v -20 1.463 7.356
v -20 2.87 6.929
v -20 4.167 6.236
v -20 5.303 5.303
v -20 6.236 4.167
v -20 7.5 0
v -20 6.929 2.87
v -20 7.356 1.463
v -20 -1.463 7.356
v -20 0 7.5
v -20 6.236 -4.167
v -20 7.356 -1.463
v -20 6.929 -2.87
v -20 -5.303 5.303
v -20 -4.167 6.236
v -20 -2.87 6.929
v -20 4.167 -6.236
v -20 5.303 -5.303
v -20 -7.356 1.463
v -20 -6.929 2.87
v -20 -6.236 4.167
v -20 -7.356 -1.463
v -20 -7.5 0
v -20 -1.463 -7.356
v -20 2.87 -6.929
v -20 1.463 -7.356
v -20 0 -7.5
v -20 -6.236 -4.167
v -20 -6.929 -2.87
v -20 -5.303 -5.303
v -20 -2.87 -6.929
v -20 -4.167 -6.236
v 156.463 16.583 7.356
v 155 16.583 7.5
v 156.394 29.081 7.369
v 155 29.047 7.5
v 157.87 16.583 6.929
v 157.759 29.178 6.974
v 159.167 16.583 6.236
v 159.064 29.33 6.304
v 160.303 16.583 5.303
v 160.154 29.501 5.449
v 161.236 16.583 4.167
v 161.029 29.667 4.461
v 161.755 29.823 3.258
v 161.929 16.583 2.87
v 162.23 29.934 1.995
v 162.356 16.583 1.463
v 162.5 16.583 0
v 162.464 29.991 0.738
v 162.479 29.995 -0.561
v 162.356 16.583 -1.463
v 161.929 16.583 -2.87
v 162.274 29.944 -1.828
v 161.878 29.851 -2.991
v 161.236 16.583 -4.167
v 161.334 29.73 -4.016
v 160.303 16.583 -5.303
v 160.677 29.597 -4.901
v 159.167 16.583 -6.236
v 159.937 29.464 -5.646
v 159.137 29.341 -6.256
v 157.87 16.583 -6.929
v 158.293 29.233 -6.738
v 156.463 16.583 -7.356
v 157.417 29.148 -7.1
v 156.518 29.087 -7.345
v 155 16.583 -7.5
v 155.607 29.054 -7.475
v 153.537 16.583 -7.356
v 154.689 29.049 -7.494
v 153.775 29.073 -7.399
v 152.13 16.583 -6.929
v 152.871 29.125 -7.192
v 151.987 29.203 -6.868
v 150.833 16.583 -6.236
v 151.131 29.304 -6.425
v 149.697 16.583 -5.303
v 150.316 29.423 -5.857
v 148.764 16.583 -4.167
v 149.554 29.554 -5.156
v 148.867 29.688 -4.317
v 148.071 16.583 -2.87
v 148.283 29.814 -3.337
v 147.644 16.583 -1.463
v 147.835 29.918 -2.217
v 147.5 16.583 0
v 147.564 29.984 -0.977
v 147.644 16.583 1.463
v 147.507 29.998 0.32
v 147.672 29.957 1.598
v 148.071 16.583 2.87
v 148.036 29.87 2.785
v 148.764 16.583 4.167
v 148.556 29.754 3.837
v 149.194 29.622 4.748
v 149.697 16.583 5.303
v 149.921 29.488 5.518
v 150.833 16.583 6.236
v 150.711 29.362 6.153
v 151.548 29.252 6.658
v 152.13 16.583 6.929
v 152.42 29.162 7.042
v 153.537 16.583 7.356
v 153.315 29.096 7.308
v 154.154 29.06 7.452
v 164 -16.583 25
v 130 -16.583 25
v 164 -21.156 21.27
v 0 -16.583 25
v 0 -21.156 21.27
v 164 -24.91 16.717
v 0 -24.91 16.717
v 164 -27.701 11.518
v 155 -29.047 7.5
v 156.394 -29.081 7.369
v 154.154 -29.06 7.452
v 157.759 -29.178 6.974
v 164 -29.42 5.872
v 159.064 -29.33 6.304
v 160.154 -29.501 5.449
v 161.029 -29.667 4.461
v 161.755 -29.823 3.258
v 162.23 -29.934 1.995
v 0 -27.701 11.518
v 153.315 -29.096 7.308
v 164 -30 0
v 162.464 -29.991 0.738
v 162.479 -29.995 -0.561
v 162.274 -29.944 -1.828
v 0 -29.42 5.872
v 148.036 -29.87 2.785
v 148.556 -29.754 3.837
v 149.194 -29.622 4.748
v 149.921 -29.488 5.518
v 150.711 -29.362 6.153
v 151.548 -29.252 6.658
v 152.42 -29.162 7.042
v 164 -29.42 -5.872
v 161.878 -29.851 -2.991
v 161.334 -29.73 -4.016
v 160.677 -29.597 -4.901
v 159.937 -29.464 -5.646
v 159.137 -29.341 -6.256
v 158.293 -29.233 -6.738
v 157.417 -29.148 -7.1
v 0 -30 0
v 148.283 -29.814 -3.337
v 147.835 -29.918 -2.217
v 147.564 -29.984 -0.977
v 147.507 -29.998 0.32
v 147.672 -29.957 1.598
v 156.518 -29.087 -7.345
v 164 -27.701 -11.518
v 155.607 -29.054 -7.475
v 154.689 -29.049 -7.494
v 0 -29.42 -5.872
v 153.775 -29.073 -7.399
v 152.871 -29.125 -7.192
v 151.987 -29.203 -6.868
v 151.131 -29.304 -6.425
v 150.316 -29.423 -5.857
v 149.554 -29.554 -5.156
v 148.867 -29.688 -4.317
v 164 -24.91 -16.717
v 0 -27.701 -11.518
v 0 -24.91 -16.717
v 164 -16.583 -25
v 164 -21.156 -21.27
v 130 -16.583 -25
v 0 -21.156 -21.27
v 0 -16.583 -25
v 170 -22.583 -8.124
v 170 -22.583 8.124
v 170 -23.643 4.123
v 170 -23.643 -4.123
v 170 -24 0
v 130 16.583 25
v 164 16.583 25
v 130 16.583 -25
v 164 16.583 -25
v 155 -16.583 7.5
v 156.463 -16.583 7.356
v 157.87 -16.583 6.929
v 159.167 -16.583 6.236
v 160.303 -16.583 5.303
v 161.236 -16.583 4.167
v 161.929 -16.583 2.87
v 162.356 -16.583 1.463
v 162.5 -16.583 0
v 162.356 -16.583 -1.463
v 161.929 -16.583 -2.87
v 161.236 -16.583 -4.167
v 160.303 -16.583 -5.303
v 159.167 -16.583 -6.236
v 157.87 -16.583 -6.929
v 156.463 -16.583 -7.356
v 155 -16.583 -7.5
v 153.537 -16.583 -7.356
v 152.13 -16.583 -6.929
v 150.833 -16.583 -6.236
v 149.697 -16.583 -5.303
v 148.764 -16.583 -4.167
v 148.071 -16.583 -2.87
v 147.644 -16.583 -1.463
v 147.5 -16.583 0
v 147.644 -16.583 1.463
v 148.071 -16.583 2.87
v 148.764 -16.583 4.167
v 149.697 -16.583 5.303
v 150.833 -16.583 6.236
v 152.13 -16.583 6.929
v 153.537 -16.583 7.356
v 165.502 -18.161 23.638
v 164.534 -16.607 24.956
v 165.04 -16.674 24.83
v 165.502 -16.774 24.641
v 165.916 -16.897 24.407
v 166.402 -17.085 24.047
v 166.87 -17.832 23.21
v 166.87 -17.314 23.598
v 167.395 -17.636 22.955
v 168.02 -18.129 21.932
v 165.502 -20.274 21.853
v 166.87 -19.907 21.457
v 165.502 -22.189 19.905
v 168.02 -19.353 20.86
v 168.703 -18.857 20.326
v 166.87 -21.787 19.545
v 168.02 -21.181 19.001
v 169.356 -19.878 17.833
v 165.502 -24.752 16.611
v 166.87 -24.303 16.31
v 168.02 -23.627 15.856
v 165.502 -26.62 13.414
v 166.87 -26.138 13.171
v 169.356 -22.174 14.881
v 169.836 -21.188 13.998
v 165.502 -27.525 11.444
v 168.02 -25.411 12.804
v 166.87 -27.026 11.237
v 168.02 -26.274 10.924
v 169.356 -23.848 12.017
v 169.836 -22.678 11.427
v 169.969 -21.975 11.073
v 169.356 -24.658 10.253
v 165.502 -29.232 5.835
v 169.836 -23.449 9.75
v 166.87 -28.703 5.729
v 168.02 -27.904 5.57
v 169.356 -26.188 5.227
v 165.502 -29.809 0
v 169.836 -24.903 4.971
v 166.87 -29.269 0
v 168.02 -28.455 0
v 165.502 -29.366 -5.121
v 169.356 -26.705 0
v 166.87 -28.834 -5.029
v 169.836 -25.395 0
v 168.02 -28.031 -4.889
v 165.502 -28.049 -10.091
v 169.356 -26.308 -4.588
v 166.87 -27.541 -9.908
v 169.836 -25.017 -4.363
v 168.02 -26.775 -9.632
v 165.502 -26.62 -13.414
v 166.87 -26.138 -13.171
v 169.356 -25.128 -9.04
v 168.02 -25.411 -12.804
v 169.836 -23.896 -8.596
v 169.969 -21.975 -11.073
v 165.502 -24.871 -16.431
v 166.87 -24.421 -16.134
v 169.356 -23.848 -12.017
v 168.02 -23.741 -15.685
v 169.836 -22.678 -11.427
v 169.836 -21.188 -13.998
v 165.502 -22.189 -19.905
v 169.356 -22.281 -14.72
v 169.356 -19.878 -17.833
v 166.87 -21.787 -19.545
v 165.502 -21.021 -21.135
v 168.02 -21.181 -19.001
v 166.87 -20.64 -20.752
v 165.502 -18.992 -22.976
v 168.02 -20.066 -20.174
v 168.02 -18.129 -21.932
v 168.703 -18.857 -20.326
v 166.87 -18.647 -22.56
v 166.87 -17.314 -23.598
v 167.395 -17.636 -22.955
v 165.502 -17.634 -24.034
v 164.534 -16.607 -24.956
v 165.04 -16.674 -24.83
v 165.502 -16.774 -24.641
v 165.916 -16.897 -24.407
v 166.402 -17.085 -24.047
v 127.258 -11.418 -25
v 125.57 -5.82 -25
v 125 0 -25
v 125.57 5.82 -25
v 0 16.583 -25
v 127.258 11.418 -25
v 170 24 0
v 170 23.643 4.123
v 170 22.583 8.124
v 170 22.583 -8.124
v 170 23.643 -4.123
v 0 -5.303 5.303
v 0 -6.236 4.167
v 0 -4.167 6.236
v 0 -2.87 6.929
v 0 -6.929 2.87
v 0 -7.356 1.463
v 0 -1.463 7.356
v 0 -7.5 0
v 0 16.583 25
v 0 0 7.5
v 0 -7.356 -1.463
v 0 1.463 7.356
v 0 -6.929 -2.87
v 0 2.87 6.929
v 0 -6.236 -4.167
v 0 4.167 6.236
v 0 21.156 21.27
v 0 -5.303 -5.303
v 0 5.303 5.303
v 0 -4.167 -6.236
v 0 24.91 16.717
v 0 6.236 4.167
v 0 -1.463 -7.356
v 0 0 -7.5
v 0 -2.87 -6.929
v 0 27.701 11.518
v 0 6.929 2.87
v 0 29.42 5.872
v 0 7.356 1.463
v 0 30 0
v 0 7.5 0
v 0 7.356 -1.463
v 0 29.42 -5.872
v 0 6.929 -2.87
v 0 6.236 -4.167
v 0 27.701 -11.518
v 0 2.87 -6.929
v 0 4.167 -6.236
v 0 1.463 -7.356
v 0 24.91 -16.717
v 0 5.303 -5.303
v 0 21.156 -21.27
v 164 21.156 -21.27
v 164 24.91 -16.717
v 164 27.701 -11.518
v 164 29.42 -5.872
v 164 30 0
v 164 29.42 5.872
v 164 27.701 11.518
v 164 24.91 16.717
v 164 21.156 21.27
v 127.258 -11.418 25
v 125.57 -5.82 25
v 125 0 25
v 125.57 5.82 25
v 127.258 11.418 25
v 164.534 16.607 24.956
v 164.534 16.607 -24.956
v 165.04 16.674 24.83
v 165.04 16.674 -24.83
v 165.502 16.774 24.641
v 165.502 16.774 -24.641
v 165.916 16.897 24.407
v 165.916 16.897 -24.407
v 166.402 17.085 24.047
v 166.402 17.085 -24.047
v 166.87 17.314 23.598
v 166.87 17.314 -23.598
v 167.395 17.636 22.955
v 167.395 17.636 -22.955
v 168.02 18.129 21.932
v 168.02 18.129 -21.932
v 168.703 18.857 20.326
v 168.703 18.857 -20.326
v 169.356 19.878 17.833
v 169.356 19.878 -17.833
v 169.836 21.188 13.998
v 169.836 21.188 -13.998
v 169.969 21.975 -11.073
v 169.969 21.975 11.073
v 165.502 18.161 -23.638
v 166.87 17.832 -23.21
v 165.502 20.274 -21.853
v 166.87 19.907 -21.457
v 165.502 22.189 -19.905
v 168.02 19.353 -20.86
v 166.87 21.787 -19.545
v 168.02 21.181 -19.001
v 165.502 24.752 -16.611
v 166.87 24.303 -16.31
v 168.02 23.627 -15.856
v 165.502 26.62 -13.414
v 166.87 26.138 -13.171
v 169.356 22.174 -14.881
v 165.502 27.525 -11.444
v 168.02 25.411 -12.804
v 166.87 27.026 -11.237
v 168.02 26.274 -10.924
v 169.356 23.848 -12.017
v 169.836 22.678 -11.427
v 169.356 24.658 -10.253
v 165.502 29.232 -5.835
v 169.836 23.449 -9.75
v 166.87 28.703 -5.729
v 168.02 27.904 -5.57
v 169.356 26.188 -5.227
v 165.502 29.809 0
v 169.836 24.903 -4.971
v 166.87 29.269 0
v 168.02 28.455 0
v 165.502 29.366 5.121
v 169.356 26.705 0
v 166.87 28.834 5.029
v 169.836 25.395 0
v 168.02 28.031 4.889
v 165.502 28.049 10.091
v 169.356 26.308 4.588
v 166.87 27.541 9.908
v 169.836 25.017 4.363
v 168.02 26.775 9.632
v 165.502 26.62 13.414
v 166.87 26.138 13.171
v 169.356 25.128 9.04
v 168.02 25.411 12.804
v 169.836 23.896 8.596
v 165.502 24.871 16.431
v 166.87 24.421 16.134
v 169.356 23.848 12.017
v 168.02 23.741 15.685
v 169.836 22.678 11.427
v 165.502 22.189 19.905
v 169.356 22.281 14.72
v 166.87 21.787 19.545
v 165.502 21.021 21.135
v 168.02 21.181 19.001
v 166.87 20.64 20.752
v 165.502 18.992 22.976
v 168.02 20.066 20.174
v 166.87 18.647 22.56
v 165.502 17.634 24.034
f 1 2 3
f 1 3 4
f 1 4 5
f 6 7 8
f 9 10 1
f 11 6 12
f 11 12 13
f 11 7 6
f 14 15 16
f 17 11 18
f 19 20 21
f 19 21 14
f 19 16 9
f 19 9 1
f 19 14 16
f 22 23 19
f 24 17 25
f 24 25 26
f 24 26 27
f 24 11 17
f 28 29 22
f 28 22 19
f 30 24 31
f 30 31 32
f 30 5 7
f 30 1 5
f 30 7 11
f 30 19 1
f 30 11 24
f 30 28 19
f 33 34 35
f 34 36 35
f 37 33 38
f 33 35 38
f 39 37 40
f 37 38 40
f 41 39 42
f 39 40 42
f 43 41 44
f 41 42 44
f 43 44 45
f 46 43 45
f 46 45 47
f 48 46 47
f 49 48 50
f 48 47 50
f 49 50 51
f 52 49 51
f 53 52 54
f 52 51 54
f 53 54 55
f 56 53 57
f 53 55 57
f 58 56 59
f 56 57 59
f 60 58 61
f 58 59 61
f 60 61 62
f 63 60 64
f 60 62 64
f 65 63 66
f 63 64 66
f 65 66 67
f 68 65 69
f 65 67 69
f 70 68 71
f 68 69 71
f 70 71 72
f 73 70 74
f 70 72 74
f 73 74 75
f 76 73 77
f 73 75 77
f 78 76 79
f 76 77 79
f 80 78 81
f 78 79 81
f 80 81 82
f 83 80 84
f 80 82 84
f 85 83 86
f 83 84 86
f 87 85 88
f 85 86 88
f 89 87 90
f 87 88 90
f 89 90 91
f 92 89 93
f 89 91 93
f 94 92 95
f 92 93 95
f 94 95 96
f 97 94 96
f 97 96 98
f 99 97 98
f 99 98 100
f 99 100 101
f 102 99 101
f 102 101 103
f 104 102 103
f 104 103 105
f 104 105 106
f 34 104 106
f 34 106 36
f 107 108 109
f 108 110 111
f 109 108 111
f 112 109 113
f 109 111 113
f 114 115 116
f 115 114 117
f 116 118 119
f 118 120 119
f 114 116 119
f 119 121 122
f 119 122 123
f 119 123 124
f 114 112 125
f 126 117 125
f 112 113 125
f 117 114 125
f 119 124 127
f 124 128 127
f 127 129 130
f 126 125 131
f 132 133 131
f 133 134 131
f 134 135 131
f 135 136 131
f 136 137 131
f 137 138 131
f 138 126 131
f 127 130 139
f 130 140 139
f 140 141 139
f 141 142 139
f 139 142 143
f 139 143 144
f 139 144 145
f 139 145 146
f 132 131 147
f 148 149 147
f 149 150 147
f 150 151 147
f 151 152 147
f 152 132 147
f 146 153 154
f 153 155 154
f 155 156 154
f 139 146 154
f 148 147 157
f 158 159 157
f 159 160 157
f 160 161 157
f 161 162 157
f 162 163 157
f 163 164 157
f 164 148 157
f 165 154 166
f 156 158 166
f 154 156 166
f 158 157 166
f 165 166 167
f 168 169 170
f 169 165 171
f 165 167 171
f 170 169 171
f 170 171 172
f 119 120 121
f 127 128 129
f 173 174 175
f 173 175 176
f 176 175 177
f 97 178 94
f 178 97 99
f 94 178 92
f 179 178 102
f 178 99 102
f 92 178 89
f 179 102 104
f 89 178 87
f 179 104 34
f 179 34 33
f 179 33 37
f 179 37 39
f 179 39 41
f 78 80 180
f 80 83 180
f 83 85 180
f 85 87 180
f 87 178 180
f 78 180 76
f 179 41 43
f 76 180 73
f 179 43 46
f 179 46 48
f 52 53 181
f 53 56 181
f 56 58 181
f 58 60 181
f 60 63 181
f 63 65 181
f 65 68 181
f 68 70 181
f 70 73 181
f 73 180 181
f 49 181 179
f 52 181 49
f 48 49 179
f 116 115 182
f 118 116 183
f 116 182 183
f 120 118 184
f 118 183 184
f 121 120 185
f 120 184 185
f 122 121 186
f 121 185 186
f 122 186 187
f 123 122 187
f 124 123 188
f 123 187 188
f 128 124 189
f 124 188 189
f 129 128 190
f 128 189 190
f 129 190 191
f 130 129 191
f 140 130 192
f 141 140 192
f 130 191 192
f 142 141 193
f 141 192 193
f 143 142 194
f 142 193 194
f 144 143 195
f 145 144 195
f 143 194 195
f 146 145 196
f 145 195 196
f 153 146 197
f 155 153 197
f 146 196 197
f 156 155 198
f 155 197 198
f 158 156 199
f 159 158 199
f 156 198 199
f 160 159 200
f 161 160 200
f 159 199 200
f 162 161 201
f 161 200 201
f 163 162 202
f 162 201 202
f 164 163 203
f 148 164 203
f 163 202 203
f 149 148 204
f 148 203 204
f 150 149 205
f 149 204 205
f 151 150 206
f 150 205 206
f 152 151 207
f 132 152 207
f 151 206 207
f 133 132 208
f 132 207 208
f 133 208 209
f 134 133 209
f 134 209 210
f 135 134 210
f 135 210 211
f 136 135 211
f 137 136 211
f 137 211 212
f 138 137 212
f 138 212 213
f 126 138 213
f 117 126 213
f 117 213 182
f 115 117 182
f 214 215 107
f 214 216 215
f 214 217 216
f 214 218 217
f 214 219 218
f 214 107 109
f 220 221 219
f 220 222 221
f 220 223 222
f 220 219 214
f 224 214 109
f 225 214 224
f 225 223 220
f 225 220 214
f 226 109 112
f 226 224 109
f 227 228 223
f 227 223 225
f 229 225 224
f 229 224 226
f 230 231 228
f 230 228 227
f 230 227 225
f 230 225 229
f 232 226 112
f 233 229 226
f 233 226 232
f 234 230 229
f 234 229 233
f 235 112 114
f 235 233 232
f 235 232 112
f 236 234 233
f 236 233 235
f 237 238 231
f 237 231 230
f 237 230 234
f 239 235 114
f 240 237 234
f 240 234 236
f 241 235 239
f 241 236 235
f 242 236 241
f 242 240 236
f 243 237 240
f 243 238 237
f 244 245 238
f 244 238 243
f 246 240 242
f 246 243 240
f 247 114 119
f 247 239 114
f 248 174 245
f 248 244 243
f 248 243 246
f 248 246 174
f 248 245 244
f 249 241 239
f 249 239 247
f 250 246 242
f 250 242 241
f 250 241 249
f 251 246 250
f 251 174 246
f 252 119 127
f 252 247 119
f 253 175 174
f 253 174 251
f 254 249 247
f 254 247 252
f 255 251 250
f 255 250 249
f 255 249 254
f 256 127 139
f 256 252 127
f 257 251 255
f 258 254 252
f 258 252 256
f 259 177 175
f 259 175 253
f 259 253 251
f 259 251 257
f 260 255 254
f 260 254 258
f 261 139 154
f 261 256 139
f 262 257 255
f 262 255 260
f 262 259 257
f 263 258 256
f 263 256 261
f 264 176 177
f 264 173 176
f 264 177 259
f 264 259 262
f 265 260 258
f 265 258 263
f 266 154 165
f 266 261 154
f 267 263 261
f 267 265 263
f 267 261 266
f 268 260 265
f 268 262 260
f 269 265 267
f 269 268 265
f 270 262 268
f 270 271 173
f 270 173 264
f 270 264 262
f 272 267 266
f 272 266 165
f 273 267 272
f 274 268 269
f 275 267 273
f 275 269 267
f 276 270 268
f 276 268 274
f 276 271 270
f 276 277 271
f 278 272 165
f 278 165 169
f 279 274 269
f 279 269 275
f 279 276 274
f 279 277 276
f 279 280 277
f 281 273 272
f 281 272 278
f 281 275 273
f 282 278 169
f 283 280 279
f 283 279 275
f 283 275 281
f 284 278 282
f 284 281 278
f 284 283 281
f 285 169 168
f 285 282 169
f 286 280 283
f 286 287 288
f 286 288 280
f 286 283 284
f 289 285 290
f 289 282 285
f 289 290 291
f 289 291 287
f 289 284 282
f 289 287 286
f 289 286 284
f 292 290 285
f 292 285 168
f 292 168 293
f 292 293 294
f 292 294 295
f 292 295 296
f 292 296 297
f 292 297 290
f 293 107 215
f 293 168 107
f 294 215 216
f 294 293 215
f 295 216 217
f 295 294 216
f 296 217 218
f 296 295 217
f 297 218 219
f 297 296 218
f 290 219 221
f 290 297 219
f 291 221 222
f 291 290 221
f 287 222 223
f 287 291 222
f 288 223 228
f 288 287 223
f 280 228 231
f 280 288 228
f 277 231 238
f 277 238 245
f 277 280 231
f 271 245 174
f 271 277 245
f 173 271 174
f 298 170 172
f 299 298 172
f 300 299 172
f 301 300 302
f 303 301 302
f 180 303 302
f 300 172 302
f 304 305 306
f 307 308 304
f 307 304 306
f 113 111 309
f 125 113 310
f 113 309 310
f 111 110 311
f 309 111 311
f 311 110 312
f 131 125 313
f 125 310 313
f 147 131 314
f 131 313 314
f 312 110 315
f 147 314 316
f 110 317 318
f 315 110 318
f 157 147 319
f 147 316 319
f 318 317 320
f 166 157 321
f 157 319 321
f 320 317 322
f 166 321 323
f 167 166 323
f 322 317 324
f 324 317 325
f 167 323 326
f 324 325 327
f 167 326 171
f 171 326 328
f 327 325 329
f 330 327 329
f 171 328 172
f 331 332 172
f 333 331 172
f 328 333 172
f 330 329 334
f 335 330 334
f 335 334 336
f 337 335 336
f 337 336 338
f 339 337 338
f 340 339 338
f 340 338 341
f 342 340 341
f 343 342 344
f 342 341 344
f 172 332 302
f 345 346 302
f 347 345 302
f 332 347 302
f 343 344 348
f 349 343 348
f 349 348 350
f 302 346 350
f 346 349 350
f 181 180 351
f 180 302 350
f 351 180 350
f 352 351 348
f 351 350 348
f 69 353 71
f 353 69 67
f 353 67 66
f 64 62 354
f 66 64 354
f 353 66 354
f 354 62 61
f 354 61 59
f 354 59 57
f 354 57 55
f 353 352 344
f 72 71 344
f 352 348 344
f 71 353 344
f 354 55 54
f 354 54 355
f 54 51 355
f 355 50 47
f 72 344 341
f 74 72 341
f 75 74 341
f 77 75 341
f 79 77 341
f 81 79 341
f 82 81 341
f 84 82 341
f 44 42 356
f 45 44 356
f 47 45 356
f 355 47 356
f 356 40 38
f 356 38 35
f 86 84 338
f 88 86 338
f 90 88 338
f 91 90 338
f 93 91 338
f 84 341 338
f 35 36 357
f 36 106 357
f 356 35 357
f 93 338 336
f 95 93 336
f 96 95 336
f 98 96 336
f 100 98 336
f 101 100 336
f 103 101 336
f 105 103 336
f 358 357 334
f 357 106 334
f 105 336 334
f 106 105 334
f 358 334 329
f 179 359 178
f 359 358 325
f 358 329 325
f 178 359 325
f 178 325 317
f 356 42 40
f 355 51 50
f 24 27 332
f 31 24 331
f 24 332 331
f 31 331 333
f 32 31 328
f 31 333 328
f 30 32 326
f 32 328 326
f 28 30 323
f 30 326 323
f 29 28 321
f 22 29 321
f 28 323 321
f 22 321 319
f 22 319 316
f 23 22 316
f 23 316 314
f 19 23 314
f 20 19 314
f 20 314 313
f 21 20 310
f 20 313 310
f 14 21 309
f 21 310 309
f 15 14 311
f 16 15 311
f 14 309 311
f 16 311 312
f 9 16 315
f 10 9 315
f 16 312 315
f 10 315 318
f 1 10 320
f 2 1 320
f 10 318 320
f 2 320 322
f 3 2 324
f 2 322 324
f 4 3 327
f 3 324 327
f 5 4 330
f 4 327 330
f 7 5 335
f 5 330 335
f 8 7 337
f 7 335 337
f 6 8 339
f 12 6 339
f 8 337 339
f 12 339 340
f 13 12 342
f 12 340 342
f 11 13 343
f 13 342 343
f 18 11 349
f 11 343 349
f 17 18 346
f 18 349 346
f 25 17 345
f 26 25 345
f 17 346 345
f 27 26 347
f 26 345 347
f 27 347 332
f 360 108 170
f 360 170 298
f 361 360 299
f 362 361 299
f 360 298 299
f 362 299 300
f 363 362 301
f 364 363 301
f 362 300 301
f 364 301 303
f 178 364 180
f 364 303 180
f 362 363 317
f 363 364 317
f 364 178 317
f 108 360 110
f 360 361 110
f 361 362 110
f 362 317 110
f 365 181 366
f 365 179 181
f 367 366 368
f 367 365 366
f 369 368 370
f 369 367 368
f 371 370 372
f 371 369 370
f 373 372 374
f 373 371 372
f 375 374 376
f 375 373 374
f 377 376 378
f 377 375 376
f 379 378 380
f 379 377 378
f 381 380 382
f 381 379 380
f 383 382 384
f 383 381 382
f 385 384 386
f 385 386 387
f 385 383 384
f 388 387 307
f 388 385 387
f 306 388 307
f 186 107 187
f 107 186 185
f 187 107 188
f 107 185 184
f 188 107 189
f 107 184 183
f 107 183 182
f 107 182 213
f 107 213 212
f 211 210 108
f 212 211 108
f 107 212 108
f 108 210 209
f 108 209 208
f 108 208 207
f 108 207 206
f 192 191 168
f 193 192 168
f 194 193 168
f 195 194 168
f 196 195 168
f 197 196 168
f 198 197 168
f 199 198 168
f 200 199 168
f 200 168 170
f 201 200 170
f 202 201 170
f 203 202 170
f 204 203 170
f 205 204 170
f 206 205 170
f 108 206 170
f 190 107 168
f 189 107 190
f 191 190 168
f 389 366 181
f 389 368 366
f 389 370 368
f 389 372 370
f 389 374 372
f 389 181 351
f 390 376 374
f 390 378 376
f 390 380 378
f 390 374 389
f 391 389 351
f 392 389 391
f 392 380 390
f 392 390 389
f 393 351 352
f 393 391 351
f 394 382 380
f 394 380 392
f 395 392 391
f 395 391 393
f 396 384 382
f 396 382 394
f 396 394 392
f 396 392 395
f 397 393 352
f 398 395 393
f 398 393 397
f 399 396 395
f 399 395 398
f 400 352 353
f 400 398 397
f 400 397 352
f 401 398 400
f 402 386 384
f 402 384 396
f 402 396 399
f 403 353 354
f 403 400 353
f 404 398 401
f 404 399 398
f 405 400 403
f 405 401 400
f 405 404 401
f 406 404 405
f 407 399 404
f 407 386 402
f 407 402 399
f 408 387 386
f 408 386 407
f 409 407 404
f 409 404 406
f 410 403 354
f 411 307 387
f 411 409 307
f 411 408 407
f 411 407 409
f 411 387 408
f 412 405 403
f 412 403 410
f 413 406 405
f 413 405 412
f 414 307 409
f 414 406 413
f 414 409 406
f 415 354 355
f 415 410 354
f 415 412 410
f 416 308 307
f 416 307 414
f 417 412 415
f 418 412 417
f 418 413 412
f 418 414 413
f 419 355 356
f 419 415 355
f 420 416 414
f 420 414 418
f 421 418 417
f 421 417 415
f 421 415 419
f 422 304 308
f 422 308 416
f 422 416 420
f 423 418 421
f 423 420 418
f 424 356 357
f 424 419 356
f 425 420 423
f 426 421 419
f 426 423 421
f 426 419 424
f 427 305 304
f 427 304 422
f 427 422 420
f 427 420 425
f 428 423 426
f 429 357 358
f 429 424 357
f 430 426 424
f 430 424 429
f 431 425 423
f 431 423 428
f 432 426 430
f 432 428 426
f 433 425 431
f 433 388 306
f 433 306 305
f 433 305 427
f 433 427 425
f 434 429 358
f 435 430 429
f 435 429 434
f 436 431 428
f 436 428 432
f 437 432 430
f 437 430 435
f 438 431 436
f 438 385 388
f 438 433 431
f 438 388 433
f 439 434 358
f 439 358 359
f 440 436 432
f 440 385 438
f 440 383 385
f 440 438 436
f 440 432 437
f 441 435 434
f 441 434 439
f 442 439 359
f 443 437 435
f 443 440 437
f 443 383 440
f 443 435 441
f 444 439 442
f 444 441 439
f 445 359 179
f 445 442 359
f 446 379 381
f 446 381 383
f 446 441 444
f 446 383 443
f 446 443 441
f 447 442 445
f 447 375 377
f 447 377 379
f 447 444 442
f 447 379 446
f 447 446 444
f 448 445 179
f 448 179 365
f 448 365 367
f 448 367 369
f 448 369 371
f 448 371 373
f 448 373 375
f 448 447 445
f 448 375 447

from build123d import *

# Parameters (mm, degrees)
BOSS_EXTRUDE1_DEPTH = 170
SKETCH5_R           = 7.5
BOSS_EXTRUDE2_DEPTH = 20
CUT_EXTRUDE1_DEPTH  = 180.722007556
SKETCH8_R           = 7.5
CUT_EXTRUDE2_DEPTH  = 48.5
FILLET1_R           = 6


with BuildPart() as part:
    # Sketch1 → Boss-Extrude1 (new body)
    with BuildSketch(Plane(origin=(0, 0, 0), x_dir=(0, 0, -1), z_dir=(1, 0, 0))):
        with BuildLine():
            Line((-25, 16.583123952), (-25, -16.583123952))
            ThreePointArc((-25, -16.583123952), (0, -30), (25, -16.583123952))
            Line((25, -16.583123952), (25, 16.583123952))
            ThreePointArc((25, 16.583123952), (0, 30), (-25, 16.583123952))
        make_face()
    extrude(amount=BOSS_EXTRUDE1_DEPTH)

    # Sketch5 → Boss-Extrude2 (add)
    with BuildSketch(Plane.ZY):
        with Locations(Location((0, 0, 0), (0, 0, 180))):
            Circle(SKETCH5_R)
    extrude(amount=BOSS_EXTRUDE2_DEPTH)

    # Sketch7 → Cut-Extrude1 (cut, through all)
    with BuildSketch(Plane(origin=(0, 0, -25), x_dir=(-1, 0, 0), z_dir=(0, 0, -1))):
        with BuildLine():
            Line((-180, -16.583123952), (-130, -16.583123952))
            ThreePointArc((-130, -16.583123952), (-125, 0), (-130, 16.583123952))
            Line((-130, 16.583123952), (-180, 16.583123952))
            ThreePointArc((-180, 16.583123952), (-185, 0), (-180, -16.583123952))
        make_face()
    extrude(amount=-CUT_EXTRUDE1_DEPTH, mode=Mode.SUBTRACT)

    # Sketch8 → Cut-Extrude2 (cut, symmetric)
    with BuildSketch(Plane(origin=(0, 0, 0), x_dir=(1, 0, 0), z_dir=(0, 1, 0))):
        with Locations(Location((155, 0, 0), (0, 0, 270))):
            Circle(SKETCH8_R)
    extrude(amount=CUT_EXTRUDE2_DEPTH, both=True, mode=Mode.SUBTRACT)

    # Fillet1
    fillet1_edges = [part.edges().sort_by_distance(p)[0] for p in [
        (170, 30, 0),
        (170, 16.583123952, 0),
        (170, -16.583123952, 0),
        (170, -30, 0),
    ]]
    fillet(fillet1_edges, radius=FILLET1_R)


solid = part.part
